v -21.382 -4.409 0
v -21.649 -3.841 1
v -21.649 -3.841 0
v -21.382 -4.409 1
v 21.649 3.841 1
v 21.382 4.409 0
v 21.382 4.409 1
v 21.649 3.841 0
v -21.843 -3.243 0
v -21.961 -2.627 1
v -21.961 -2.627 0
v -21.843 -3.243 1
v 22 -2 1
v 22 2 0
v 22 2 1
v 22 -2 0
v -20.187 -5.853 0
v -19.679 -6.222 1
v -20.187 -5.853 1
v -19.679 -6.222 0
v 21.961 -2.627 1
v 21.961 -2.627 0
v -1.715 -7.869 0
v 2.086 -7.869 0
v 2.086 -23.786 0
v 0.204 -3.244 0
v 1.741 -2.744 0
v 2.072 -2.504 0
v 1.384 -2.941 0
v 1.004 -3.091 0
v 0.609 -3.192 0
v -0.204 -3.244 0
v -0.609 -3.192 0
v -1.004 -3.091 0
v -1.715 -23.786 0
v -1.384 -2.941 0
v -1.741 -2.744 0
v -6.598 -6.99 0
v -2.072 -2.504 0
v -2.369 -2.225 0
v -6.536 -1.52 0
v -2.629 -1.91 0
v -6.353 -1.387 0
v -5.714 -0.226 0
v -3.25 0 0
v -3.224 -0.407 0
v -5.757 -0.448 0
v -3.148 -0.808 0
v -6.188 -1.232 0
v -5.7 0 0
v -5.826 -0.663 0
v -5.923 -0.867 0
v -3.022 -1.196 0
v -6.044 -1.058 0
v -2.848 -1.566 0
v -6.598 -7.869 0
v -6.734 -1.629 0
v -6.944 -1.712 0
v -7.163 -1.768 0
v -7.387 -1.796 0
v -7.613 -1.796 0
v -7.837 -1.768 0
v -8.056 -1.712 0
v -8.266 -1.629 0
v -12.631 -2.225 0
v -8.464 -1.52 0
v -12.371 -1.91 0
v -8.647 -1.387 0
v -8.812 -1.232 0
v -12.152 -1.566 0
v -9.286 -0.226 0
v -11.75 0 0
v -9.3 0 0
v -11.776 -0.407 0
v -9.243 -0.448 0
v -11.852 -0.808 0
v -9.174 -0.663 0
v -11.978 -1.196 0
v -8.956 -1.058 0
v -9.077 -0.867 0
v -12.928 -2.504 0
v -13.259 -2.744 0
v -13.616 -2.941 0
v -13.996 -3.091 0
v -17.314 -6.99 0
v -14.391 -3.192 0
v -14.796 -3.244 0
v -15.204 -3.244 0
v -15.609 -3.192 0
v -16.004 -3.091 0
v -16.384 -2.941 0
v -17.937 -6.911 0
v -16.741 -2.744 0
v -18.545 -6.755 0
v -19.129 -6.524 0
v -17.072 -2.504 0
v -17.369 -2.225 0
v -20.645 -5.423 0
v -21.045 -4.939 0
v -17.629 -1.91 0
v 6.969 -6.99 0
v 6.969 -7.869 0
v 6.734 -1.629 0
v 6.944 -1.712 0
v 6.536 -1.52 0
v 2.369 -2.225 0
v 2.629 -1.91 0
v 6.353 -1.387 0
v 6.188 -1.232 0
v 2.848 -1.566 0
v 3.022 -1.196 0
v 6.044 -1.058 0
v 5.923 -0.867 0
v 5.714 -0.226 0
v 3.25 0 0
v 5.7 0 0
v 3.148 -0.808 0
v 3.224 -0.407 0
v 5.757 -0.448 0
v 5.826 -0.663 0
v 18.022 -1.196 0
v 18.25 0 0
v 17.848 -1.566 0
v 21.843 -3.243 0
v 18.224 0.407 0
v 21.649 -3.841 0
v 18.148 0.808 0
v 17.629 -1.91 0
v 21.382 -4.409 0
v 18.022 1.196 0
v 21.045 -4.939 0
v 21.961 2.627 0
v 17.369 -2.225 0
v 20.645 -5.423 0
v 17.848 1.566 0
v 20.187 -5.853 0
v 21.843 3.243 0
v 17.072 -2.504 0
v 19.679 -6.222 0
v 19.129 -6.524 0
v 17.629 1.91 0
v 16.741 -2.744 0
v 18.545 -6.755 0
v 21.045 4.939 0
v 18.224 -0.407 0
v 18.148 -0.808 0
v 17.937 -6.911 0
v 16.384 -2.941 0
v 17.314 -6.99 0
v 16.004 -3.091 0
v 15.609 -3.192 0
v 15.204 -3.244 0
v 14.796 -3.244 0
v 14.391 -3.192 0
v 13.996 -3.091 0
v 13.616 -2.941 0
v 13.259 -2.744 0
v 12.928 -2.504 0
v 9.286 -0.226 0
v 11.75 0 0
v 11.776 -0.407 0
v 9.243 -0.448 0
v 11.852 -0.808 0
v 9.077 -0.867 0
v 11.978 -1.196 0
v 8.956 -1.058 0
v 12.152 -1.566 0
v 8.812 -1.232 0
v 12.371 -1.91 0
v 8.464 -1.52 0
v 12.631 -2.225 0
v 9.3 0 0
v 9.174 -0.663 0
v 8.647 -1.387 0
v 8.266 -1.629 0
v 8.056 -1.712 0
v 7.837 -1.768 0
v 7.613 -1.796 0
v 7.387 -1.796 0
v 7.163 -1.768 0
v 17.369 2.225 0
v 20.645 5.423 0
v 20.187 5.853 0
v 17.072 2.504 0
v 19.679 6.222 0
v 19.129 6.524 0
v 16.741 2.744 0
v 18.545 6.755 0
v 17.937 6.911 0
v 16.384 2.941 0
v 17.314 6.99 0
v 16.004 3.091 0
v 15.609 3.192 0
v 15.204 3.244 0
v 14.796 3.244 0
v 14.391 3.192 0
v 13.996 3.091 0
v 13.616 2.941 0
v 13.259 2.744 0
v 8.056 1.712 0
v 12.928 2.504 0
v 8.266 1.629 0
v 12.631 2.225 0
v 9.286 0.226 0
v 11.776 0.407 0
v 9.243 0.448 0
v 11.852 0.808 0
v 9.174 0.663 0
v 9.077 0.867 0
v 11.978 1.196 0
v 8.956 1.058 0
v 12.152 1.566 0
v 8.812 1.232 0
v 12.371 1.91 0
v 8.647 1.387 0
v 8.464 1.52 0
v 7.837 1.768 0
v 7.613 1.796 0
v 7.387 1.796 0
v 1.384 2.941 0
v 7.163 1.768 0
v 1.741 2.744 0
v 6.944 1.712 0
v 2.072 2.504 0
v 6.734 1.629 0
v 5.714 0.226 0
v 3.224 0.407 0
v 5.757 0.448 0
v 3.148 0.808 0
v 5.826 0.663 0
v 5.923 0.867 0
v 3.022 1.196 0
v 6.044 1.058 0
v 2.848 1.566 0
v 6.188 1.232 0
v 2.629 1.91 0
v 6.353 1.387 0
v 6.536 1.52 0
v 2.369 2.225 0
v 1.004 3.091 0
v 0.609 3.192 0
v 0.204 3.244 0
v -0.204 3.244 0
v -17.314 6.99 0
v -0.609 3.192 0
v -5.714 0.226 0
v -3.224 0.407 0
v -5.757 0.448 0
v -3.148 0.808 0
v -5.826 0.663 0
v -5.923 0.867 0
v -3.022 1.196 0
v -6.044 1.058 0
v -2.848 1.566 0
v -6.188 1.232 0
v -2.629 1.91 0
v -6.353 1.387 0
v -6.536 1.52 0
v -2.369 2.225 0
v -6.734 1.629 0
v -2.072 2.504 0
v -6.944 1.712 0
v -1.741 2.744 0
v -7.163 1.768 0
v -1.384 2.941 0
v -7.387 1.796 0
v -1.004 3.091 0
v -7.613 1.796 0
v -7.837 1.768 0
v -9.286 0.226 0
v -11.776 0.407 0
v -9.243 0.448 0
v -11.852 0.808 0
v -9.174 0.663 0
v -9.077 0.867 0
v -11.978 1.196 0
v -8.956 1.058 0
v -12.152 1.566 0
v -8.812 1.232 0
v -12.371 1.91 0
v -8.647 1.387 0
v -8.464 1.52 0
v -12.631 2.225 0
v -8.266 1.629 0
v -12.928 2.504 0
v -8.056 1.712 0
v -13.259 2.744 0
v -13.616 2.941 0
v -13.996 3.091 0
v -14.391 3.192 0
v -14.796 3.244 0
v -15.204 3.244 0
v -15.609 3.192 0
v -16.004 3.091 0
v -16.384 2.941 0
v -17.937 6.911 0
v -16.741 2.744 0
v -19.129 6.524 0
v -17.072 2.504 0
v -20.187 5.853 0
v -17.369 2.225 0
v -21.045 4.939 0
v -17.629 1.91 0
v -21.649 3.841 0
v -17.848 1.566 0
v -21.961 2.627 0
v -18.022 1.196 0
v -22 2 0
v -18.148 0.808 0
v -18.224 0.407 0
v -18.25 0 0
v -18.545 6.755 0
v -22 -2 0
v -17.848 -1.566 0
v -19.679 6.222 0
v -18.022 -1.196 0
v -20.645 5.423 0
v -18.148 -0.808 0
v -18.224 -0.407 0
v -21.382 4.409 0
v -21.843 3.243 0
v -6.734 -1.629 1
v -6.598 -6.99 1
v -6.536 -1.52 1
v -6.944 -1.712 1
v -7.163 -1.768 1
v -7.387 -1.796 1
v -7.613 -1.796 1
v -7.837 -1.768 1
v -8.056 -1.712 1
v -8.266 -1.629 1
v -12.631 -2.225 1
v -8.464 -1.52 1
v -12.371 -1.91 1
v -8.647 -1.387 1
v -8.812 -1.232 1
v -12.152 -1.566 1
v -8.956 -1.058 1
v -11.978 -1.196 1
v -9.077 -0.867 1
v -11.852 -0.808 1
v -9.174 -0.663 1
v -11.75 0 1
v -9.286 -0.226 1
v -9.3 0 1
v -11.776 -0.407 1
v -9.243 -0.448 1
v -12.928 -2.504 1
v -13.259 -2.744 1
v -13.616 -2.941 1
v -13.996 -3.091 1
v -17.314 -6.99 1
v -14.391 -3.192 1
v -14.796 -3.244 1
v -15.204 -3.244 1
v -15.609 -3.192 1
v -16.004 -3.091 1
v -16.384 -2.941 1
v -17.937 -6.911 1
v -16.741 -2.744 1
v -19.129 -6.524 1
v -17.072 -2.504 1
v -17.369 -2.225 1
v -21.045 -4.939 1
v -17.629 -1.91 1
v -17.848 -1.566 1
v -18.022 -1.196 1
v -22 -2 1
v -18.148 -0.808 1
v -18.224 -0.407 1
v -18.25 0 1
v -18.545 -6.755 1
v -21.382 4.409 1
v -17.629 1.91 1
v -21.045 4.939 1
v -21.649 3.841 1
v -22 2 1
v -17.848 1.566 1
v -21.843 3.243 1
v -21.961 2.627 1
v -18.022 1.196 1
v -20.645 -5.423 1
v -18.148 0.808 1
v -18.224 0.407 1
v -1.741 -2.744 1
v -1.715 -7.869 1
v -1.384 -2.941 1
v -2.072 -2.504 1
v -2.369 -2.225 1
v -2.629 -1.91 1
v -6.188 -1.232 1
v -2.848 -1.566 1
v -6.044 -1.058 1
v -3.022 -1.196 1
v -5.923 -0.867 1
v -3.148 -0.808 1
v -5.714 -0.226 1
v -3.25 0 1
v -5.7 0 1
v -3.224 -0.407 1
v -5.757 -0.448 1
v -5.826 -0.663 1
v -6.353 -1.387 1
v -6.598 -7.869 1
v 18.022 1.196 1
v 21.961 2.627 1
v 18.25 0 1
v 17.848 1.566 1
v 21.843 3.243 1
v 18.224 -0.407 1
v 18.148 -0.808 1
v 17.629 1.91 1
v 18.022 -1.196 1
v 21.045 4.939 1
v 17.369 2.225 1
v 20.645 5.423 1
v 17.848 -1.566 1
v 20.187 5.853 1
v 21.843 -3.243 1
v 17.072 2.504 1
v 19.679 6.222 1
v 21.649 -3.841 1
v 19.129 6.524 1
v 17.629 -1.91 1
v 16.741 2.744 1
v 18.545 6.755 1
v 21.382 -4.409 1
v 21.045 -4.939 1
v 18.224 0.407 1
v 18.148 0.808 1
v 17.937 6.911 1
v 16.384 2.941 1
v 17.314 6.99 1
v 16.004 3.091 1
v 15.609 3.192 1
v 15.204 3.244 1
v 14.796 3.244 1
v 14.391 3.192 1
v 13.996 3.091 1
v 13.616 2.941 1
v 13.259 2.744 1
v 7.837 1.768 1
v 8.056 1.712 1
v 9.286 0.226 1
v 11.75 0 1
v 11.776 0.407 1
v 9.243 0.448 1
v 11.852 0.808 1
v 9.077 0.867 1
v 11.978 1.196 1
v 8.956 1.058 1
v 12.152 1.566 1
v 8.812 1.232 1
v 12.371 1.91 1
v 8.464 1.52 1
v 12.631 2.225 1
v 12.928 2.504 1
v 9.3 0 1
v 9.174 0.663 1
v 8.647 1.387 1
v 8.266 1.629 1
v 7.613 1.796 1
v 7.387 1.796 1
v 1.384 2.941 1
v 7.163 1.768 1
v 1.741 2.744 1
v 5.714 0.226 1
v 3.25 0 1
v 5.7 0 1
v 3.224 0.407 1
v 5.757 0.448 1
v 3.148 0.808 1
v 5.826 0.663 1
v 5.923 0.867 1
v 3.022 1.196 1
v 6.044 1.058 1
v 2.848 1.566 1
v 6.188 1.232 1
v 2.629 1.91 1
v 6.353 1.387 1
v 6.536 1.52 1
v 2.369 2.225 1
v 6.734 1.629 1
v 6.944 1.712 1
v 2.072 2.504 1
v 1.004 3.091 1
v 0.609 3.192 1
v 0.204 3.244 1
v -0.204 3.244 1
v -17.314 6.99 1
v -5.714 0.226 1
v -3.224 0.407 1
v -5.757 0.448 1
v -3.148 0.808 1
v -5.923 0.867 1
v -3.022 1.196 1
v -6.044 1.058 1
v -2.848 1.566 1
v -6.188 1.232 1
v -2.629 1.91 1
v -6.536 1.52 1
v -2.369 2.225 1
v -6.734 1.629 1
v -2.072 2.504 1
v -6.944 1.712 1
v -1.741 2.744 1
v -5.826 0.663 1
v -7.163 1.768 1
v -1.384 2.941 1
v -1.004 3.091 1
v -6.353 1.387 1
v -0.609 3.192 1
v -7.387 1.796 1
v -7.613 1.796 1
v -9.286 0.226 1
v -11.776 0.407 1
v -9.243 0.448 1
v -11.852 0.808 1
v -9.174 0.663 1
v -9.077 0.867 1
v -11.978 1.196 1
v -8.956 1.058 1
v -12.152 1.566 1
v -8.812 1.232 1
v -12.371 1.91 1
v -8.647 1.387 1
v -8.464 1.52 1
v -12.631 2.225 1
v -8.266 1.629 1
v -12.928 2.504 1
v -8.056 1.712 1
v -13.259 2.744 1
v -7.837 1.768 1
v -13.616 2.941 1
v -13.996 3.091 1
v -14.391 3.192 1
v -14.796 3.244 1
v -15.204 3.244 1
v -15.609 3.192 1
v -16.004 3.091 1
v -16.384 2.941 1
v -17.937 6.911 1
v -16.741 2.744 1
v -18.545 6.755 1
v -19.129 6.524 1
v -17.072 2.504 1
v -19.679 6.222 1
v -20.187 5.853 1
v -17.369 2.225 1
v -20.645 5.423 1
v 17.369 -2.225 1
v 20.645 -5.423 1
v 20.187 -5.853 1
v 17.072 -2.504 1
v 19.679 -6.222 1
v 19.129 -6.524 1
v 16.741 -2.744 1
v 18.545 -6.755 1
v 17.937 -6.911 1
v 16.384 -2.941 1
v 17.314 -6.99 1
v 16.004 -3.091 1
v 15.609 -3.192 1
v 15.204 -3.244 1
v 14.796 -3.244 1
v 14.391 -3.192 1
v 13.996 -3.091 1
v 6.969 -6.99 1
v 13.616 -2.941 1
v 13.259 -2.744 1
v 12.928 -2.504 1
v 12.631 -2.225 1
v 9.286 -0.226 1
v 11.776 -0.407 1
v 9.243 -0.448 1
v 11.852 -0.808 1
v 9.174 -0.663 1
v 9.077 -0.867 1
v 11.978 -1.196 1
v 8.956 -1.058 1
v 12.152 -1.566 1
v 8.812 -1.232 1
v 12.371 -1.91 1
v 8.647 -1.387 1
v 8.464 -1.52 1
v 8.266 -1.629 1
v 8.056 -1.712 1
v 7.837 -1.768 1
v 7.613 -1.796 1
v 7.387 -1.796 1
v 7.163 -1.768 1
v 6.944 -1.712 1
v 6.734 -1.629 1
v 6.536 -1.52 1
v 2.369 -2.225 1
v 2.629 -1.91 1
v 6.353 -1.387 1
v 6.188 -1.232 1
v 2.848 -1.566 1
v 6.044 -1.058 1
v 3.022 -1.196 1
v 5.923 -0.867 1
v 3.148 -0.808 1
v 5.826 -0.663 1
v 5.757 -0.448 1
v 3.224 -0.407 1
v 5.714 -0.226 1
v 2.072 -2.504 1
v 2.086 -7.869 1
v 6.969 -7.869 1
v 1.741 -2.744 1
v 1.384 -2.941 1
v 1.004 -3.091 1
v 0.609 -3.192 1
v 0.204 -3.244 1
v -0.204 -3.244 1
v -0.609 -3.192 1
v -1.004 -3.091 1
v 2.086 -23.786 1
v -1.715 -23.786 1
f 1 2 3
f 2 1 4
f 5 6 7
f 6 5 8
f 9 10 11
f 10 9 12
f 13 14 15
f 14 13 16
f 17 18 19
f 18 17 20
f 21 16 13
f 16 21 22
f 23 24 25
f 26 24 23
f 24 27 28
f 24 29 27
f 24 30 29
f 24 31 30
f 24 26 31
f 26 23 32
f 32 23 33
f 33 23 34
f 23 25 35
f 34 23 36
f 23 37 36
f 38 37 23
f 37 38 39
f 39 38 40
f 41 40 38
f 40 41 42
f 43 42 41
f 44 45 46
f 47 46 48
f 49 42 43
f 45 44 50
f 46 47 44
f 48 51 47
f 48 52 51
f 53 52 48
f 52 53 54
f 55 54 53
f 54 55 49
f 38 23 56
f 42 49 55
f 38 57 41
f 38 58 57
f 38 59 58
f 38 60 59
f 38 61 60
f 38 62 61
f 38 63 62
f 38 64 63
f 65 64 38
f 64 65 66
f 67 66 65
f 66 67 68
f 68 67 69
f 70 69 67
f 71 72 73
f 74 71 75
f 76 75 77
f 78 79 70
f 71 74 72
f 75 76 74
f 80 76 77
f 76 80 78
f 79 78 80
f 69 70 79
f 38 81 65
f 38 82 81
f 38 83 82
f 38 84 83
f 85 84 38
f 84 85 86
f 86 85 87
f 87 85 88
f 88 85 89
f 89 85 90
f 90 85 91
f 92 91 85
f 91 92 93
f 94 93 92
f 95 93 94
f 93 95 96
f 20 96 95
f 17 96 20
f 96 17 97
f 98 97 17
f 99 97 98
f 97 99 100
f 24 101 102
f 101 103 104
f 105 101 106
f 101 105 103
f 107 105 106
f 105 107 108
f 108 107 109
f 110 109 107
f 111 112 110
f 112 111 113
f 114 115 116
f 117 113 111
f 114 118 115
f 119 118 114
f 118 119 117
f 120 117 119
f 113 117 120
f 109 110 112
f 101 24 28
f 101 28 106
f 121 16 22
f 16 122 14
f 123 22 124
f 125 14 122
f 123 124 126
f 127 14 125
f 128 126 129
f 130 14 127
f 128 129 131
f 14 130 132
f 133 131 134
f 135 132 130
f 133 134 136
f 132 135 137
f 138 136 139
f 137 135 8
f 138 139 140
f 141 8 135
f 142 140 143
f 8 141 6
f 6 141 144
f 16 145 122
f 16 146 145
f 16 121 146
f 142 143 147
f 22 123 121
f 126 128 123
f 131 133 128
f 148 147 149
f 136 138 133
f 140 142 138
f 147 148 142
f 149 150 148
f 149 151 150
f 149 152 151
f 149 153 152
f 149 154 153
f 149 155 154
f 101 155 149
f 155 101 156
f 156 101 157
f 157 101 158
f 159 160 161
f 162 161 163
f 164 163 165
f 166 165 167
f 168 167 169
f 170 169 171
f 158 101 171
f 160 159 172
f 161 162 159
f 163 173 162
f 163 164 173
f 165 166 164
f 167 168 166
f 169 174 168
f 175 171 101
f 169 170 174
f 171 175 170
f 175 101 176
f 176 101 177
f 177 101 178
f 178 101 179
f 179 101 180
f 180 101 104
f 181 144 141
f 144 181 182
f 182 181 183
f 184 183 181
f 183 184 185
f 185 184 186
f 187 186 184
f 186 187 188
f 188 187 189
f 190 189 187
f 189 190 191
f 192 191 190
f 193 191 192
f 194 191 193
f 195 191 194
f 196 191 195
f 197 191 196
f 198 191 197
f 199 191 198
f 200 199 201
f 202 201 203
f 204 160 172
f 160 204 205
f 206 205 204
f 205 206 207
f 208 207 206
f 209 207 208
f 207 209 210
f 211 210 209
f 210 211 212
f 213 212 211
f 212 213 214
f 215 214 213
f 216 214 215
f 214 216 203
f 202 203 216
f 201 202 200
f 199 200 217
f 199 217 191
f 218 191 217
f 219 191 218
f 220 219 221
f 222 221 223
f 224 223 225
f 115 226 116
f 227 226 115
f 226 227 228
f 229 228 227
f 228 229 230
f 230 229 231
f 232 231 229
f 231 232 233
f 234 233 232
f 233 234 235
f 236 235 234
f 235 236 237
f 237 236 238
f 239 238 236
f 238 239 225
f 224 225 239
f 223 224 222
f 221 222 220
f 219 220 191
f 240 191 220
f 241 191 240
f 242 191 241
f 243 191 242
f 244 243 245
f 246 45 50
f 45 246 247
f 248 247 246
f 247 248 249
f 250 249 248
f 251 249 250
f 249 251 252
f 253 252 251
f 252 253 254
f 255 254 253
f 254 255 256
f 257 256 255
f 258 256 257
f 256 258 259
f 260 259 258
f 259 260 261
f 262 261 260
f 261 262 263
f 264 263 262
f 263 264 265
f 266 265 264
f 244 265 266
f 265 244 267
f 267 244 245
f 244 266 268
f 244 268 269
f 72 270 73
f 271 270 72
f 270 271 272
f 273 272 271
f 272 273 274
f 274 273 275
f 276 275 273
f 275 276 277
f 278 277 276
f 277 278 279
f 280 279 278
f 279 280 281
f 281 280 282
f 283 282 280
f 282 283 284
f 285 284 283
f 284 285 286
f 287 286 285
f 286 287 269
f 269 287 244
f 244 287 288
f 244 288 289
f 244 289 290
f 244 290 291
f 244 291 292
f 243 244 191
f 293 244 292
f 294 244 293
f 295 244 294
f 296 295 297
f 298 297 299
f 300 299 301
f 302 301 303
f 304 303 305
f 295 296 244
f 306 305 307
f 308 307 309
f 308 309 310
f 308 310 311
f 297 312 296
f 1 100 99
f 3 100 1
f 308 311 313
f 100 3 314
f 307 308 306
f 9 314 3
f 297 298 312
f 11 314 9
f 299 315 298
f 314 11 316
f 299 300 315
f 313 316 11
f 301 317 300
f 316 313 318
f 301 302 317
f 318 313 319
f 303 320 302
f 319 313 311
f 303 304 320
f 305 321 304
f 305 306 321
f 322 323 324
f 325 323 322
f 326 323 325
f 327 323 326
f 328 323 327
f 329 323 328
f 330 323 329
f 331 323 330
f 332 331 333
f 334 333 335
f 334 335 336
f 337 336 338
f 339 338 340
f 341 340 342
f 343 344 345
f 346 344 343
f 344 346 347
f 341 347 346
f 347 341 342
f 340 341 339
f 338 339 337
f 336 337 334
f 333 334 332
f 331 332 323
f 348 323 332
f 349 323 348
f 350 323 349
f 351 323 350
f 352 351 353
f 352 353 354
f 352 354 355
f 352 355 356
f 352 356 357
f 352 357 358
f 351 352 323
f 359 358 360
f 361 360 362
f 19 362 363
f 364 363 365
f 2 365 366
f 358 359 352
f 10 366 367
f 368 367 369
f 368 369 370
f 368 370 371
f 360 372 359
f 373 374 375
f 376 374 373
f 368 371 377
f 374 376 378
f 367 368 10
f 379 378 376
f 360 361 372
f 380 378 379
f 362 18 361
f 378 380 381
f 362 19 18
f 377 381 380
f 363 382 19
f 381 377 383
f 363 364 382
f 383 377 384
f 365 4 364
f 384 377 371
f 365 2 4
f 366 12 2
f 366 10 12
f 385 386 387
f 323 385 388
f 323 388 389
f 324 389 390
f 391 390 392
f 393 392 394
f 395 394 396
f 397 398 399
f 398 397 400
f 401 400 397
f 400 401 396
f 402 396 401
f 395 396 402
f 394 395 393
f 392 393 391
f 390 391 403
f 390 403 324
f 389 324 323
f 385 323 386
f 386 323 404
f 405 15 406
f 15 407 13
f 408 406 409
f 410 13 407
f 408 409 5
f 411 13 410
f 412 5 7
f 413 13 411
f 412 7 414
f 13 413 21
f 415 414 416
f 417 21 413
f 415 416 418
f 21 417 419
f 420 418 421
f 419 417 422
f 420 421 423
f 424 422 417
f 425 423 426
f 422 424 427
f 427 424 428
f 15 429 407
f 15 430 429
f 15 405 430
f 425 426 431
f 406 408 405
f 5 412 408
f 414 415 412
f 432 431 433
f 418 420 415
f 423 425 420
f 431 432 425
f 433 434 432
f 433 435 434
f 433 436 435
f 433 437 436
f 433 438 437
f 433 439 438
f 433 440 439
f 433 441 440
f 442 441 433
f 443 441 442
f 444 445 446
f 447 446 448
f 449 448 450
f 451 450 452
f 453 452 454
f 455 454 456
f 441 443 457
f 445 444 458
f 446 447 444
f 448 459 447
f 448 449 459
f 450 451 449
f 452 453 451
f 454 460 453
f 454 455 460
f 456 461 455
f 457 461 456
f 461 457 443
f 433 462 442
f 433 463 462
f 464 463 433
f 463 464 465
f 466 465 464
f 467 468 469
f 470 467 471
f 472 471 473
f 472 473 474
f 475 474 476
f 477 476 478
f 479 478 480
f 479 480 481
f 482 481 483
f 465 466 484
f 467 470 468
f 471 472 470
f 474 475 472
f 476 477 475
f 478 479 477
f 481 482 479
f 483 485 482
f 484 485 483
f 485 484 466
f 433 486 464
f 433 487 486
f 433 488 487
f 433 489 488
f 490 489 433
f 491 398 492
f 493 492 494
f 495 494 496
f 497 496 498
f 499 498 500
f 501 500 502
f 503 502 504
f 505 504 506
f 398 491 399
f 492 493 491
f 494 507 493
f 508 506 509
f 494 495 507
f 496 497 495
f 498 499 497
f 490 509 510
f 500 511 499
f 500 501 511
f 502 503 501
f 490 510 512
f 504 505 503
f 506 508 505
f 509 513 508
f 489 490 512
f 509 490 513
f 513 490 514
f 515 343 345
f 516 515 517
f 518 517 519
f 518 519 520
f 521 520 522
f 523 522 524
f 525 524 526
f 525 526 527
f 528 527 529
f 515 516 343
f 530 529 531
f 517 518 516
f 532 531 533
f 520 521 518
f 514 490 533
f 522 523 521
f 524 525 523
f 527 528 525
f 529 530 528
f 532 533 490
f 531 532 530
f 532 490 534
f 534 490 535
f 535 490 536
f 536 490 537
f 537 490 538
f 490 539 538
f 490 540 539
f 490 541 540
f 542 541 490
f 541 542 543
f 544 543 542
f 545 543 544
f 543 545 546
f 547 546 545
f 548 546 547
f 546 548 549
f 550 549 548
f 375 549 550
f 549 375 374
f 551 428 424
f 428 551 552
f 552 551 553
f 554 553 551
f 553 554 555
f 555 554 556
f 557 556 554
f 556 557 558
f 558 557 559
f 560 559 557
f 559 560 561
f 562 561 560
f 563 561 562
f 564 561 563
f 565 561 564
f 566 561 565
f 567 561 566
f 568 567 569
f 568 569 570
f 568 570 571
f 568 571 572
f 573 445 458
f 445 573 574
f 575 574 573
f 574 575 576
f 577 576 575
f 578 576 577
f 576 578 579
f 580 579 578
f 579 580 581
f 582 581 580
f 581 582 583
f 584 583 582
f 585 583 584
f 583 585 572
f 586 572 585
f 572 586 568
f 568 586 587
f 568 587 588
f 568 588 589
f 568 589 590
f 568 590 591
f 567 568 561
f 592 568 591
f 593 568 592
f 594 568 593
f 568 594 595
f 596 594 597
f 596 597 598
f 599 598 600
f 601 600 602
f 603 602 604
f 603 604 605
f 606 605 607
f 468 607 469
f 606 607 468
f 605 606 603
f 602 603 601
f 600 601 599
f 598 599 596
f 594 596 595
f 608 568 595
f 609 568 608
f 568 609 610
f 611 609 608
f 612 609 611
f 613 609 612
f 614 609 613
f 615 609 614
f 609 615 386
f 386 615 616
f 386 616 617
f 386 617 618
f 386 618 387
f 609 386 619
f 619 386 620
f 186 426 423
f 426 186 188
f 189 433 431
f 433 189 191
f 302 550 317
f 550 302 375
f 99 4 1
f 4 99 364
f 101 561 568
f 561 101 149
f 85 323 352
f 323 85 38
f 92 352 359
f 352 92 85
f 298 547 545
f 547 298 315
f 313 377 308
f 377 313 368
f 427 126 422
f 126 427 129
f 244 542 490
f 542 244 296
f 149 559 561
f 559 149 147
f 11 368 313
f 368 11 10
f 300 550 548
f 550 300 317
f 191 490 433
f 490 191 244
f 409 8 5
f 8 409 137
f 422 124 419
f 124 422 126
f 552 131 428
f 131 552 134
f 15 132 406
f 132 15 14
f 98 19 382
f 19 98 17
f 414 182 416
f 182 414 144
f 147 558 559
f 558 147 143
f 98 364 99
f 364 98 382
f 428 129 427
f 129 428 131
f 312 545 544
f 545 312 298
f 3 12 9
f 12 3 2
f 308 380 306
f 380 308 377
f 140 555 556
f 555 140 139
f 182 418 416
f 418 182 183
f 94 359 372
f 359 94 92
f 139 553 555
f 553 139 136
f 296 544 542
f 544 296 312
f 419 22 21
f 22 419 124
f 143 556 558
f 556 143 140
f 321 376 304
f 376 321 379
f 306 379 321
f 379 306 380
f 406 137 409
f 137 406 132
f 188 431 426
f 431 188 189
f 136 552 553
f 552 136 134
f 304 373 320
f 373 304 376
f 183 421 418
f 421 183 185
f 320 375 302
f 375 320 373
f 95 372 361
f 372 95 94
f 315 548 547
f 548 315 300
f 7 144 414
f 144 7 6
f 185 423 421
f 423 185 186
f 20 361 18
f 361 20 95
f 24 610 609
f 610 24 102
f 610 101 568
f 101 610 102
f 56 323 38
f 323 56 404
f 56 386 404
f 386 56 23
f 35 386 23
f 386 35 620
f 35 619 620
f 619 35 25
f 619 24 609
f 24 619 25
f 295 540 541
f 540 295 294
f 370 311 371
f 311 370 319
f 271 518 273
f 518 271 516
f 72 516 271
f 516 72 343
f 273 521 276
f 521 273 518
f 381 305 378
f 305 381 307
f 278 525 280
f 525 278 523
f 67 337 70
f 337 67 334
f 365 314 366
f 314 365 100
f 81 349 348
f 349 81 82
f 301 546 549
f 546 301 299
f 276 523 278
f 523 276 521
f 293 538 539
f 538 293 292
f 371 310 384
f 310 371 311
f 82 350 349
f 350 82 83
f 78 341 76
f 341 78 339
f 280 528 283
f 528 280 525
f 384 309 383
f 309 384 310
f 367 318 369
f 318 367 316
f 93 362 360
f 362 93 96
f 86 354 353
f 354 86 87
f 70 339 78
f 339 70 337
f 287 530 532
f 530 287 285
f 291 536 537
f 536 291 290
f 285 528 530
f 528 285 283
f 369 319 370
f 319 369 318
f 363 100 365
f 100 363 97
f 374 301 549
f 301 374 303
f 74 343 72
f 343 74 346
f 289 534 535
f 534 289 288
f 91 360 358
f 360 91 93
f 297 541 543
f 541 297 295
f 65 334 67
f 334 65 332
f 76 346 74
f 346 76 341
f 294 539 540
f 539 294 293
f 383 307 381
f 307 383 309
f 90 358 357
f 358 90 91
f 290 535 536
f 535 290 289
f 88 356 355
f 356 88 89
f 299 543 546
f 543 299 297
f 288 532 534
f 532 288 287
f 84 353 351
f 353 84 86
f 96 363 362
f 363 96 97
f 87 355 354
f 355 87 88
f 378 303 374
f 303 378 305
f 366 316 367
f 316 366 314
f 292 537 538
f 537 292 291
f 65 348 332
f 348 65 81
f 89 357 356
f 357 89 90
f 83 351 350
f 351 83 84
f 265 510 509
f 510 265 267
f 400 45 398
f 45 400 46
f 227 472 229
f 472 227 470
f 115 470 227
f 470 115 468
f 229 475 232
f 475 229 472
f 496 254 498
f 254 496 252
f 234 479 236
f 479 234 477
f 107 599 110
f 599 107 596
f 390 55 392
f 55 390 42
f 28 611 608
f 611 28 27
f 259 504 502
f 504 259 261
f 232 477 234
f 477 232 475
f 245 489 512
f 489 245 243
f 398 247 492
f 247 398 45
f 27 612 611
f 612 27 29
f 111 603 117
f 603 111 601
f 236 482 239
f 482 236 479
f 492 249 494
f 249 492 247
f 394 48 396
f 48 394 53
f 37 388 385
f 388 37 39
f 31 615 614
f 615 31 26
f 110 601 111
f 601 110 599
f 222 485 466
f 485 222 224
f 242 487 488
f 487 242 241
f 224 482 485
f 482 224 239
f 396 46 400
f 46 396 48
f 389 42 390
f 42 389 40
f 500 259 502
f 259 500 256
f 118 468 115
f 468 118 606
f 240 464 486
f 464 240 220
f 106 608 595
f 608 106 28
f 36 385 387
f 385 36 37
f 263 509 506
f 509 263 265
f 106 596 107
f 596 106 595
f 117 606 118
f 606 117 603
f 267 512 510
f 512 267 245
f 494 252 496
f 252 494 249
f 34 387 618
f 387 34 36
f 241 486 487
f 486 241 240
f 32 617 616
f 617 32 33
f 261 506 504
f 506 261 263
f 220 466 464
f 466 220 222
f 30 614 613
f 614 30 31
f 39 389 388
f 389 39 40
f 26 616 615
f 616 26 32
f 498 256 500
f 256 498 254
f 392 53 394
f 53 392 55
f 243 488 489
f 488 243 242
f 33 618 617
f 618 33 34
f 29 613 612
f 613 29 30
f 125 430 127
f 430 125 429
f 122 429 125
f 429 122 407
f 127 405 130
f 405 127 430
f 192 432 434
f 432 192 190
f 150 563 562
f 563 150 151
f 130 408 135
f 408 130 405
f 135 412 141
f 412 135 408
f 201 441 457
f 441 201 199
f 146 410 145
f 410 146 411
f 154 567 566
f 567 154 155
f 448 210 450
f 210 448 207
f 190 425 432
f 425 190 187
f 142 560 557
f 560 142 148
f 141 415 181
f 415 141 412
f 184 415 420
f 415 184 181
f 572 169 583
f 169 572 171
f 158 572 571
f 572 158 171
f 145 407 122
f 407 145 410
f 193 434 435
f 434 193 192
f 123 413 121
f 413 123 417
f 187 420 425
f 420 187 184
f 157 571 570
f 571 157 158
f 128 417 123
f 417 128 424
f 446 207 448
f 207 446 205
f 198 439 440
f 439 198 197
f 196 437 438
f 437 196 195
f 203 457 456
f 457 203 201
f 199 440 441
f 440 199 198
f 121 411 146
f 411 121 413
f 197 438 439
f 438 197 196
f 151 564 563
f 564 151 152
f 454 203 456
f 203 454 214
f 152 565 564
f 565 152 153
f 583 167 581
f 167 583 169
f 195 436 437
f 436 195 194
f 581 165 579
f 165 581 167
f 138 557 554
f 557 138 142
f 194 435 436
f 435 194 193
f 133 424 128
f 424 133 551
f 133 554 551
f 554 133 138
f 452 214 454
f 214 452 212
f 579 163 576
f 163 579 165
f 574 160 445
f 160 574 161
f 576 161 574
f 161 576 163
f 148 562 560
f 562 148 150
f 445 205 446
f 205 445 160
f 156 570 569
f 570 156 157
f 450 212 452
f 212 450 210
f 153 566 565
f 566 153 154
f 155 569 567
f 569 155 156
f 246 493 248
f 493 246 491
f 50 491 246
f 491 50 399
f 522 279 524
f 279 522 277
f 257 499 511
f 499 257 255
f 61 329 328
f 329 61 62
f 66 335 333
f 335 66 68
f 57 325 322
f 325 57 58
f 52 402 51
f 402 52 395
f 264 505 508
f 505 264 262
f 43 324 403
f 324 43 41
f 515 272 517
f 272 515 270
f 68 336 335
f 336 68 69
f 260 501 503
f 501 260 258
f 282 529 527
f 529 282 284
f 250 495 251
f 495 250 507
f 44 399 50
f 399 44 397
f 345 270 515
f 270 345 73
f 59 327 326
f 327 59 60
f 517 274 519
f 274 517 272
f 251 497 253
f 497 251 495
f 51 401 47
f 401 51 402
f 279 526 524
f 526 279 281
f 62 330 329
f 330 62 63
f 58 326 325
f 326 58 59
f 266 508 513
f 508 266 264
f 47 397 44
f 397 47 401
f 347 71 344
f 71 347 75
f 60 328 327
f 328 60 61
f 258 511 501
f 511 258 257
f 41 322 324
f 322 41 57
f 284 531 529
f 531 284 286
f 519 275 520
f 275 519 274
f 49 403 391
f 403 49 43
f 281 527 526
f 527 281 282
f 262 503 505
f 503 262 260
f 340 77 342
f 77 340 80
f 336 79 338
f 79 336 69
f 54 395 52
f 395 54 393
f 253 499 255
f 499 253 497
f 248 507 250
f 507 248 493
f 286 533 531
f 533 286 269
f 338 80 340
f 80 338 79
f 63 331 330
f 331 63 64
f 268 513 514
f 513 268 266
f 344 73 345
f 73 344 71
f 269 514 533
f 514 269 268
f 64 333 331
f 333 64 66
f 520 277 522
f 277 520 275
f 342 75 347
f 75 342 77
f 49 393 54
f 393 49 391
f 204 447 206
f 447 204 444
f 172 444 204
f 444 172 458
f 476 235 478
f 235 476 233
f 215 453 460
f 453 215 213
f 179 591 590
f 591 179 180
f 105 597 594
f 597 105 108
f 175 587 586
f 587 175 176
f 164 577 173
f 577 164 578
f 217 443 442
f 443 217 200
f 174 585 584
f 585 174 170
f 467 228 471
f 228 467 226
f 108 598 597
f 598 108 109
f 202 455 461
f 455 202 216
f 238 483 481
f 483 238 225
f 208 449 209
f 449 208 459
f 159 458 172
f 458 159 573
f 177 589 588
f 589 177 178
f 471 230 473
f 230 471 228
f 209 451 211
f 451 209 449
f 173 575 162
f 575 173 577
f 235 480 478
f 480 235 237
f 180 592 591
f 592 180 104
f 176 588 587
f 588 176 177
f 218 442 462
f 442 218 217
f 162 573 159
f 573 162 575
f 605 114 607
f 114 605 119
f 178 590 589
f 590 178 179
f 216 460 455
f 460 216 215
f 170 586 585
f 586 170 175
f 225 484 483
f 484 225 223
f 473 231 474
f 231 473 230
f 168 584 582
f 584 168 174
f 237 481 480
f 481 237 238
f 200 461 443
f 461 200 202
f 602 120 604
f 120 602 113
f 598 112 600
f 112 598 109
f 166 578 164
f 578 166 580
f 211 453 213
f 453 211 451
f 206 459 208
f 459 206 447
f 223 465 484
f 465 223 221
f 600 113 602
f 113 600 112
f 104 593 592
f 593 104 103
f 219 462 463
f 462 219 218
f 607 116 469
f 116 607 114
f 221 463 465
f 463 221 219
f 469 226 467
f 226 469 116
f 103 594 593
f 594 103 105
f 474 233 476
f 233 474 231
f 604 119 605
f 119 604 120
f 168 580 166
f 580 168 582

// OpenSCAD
$fn = 50;


difference() {
	union() {
		*color(alpha = 1.0000000000, c = "gray") {
			translate(v = [0, 14, 0]) {
				linear_extrude(height = 1) {
					text(font = "Arial:style=Bold", halign = "center", size = 4.5000000000, text = "COMMENT description oobb_plate_shape_p_type_1_depth_3_width_1_thickness_t_extra_oobb_size", valign = "center");
				}
			}
		}
		hull() {
			translate(v = [-17.0000000000, 2.0000000000, 0]) {
				cylinder(h = 1, r = 5);
			}
			translate(v = [17.0000000000, 2.0000000000, 0]) {
				cylinder(h = 1, r = 5);
			}
			translate(v = [-17.0000000000, -2.0000000000, 0]) {
				cylinder(h = 1, r = 5);
			}
			translate(v = [17.0000000000, -2.0000000000, 0]) {
				cylinder(h = 1, r = 5);
			}
		}
		translate(v = [0, -5, 0]) {
			linear_extrude(height = 1) {
				text(font = "DejaVu Sans Mono:style=Bold", halign = "center", size = 19.0000000000, text = "T", valign = "top");
			}
		}
	}
	union() {
		*color(alpha = 1.0000000000, c = "gray") {
			translate(v = [0, 14, 0]) {
				linear_extrude(height = 1) {
					text(font = "Arial:style=Bold", halign = "center", size = 4.5000000000, text = "COMMENT description oobb_holes_shape_n_type_3_width_1_thickness_t_extra_oobb_size_1_height_'all'_holes_true_both_holes", valign = "center");
				}
			}
		}
		translate(v = [-15.0000000000, 0.0000000000, 0]) {
			translate(v = [0, 0, -50]) {
				cylinder(h = 100, r = 3.2500000000);
			}
		}
		translate(v = [0, 0, -50]) {
			cylinder(h = 100, r = 3.2500000000);
		}
		translate(v = [15.0000000000, 0.0000000000, 0]) {
			translate(v = [0, 0, -50]) {
				cylinder(h = 100, r = 3.2500000000);
			}
		}
		translate(v = [-15.0000000000, 0.0000000000, 0]) {
			translate(v = [0, 0, -50]) {
				cylinder(h = 100, r = 1.8000000000);
			}
		}
		translate(v = [-7.5000000000, 0.0000000000, 0]) {
			translate(v = [0, 0, -50]) {
				cylinder(h = 100, r = 1.8000000000);
			}
		}
		translate(v = [0, 0, -50]) {
			cylinder(h = 100, r = 1.8000000000);
		}
		translate(v = [7.5000000000, 0.0000000000, 0]) {
			translate(v = [0, 0, -50]) {
				cylinder(h = 100, r = 1.8000000000);
			}
		}
		translate(v = [15.0000000000, 0.0000000000, 0]) {
			translate(v = [0, 0, -50]) {
				cylinder(h = 100, r = 1.8000000000);
			}
		}
	}
}
